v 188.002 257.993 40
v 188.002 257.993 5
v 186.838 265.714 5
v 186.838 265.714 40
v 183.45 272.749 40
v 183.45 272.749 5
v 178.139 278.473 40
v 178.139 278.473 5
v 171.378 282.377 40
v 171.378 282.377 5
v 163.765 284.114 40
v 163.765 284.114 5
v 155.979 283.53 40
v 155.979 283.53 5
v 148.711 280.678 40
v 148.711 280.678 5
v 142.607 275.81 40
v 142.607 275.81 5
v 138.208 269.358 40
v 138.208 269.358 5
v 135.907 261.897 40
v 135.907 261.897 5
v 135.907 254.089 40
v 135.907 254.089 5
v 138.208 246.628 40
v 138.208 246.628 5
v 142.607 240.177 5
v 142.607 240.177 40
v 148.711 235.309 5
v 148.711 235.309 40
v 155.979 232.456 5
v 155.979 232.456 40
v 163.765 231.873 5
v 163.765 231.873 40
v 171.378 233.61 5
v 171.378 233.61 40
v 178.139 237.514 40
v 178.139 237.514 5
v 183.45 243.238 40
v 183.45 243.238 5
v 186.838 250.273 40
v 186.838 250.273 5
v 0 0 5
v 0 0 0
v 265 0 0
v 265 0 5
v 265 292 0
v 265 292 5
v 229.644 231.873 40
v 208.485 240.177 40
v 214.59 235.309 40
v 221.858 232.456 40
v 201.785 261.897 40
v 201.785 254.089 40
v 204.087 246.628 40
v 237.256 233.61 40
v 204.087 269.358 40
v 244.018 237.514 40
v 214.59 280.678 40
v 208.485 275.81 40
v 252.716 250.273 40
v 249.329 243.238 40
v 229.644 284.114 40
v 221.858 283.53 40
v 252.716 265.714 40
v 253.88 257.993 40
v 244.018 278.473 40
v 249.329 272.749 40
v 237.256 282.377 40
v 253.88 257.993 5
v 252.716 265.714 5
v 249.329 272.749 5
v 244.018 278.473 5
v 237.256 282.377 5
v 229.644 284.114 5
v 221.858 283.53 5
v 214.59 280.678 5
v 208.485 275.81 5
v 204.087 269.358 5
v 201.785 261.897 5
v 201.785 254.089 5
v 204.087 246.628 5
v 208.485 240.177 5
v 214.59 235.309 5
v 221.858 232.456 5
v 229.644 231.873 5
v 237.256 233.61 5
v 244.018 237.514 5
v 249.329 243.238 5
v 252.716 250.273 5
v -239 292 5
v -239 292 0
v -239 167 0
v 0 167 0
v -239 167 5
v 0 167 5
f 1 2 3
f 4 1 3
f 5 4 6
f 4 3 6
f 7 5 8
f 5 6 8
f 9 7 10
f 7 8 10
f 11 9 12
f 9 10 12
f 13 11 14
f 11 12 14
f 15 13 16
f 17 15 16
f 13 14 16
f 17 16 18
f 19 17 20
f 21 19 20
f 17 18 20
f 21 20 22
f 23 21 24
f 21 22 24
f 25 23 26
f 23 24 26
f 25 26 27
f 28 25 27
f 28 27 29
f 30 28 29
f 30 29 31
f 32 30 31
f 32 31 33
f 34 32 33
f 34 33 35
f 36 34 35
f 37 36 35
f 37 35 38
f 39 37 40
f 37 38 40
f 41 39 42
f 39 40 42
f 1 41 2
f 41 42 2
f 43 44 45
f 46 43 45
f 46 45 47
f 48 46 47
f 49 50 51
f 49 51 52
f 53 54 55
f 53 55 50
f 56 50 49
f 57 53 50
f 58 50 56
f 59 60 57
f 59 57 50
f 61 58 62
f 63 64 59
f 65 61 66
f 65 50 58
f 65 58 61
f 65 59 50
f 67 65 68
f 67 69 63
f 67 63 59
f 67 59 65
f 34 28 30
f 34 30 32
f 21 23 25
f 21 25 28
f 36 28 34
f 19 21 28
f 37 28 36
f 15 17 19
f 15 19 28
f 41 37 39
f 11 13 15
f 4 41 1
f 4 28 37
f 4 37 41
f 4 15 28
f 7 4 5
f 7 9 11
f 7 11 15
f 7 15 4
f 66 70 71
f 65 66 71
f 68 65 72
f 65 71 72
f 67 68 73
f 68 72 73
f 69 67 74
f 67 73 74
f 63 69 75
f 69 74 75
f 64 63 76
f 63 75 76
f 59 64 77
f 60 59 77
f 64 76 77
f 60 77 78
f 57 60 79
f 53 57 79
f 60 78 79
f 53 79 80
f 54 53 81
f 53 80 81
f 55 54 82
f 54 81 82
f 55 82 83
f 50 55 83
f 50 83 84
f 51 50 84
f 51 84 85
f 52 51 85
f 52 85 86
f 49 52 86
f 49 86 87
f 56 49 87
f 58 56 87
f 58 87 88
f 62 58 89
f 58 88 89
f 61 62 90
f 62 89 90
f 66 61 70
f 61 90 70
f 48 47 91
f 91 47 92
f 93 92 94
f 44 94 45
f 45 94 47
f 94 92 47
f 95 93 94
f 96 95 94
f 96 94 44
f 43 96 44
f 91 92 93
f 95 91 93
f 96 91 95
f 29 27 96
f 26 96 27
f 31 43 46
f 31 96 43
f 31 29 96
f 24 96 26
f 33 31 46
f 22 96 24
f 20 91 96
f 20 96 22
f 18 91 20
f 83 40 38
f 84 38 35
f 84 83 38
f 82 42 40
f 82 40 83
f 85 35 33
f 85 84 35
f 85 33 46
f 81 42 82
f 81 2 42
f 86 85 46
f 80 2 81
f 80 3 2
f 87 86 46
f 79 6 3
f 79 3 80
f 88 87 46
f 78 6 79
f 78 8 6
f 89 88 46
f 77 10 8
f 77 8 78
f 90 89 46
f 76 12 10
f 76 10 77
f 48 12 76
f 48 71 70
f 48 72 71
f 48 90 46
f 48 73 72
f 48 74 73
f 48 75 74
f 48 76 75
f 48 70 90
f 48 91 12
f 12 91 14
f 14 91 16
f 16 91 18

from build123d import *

# Parameters (mm, degrees)
BOSS_EXTRUDE1_DEPTH = 5
SKETCH2_R           = 26.19375
BOSS_EXTRUDE2_DEPTH = 35


with BuildPart() as part:
    # Sketch1 → Boss-Extrude1 (new body)
    with BuildSketch(Plane.XY):
        Polygon((0, 0), (265, 0), (265, 292), (-239, 292), (-239, 167), (0, 167), align=None)
    extrude(amount=BOSS_EXTRUDE1_DEPTH)

    # Sketch2 → Boss-Extrude2 (add)
    with BuildSketch(Plane.XY.offset(5)):
        with Locations((227.686407853, 257.993451028)):
            Circle(SKETCH2_R)
        with Locations((161.807907248, 257.993451028)):
            Circle(SKETCH2_R)
    extrude(amount=BOSS_EXTRUDE2_DEPTH)


solid = part.part
